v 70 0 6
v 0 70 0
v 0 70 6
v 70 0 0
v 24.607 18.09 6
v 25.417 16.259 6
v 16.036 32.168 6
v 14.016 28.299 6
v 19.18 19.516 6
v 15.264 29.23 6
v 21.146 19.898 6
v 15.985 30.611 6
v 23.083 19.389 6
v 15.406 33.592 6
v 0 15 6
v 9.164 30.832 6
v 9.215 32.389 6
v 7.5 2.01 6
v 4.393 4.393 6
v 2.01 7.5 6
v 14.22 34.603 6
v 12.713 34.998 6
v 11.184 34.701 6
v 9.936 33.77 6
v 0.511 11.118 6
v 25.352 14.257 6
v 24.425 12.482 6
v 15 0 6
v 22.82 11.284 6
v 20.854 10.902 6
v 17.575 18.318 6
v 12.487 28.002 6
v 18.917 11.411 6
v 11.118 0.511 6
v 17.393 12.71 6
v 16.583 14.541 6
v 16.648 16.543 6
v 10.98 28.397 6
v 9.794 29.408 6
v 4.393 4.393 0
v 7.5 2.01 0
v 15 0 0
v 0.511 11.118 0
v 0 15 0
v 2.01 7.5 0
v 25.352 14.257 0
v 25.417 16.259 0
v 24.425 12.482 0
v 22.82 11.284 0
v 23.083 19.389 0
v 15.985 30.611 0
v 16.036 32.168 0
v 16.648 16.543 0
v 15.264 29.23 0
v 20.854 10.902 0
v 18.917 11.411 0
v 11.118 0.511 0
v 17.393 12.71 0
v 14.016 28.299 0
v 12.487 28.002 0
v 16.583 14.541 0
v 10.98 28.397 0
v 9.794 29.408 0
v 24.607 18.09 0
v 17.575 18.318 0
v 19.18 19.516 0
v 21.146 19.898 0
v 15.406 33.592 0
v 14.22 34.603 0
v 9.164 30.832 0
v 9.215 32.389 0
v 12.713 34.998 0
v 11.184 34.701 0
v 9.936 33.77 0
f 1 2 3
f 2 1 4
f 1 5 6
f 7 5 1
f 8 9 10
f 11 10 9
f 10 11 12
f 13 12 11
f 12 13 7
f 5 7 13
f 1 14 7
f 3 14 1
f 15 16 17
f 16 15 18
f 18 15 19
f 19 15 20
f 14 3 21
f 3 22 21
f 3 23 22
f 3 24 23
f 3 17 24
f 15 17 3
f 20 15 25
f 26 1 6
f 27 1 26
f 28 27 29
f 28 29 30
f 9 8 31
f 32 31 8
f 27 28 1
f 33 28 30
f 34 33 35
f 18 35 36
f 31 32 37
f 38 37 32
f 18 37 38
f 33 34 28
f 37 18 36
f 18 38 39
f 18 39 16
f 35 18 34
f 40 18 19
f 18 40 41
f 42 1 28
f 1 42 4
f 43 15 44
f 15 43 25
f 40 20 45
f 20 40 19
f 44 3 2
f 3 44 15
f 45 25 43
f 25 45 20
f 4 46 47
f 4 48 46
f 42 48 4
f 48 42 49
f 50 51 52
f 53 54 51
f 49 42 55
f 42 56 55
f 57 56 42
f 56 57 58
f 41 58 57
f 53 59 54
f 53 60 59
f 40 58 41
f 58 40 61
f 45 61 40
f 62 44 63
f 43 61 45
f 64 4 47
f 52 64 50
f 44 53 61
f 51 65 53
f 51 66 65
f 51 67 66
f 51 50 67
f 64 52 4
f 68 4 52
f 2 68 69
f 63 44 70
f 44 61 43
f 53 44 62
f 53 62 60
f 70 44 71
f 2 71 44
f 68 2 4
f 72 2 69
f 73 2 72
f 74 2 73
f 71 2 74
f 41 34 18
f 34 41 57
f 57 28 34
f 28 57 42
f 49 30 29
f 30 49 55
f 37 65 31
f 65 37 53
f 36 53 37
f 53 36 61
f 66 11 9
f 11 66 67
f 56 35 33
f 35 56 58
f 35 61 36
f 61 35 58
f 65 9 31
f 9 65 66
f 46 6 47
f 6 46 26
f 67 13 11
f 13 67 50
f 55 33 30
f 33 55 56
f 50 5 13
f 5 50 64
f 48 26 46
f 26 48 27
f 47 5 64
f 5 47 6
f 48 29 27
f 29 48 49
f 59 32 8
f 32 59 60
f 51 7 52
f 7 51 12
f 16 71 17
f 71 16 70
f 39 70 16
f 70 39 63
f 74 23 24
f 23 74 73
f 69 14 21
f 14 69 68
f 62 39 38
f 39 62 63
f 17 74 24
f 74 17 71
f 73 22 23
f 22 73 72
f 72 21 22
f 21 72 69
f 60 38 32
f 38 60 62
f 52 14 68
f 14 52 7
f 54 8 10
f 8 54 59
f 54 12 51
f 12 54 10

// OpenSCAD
$fn = 32;

// ----------------------------------------------------------------------
// Bracket plate: corner pad 70 x 70, fillet R15
// ----------------------------------------------------------------------

// --- parameters (mm) ---
hole_r = 3.5;             // bolt hole radius
plate_t = 6;              // plate thickness, Z (extrusion height)
leg_a = 70;               // base leg
leg_b = 70;               // height leg
fillet_r = 15;            // right-angle fillet radius

hole_d1 = 2 * hole_r + 2;
hole_d2 = 2 * hole_r;

profile = [[15, 0], [70, 0], [0, 70], [0, 15], [0.511, 11.118], [2.01, 7.5], [4.393, 4.393], [7.5, 2.01], [11.118, 0.511]];  // primary outline, 9 points, counter clockwise
void_1 = [[25.417, 16.259], [24.607, 18.09], [23.083, 19.389], [21.146, 19.898], [19.18, 19.516], [17.575, 18.318], [16.648, 16.543], [16.583, 14.541], [17.393, 12.71], [18.917, 11.411], [20.854, 10.902], [22.82, 11.284], [24.425, 12.482], [25.352, 14.257]];  // mount hole 1, 14 points
void_2 = [[16.036, 32.168], [15.406, 33.592], [14.22, 34.603], [12.713, 34.998], [11.184, 34.701], [9.936, 33.77], [9.215, 32.389], [9.164, 30.832], [9.794, 29.408], [10.98, 28.397], [12.487, 28.002], [14.016, 28.299], [15.264, 29.23], [15.985, 30.611]];  // mount hole 2, 14 points

// --- the one profile operation ---
difference() {
  linear_extrude(height = plate_t) polygon(points = profile);
  translate([0, 0, -1])
    linear_extrude(height = plate_t + 2) polygon(points = void_1);
  translate([0, 0, -1])
    linear_extrude(height = plate_t + 2) polygon(points = void_2);
}
